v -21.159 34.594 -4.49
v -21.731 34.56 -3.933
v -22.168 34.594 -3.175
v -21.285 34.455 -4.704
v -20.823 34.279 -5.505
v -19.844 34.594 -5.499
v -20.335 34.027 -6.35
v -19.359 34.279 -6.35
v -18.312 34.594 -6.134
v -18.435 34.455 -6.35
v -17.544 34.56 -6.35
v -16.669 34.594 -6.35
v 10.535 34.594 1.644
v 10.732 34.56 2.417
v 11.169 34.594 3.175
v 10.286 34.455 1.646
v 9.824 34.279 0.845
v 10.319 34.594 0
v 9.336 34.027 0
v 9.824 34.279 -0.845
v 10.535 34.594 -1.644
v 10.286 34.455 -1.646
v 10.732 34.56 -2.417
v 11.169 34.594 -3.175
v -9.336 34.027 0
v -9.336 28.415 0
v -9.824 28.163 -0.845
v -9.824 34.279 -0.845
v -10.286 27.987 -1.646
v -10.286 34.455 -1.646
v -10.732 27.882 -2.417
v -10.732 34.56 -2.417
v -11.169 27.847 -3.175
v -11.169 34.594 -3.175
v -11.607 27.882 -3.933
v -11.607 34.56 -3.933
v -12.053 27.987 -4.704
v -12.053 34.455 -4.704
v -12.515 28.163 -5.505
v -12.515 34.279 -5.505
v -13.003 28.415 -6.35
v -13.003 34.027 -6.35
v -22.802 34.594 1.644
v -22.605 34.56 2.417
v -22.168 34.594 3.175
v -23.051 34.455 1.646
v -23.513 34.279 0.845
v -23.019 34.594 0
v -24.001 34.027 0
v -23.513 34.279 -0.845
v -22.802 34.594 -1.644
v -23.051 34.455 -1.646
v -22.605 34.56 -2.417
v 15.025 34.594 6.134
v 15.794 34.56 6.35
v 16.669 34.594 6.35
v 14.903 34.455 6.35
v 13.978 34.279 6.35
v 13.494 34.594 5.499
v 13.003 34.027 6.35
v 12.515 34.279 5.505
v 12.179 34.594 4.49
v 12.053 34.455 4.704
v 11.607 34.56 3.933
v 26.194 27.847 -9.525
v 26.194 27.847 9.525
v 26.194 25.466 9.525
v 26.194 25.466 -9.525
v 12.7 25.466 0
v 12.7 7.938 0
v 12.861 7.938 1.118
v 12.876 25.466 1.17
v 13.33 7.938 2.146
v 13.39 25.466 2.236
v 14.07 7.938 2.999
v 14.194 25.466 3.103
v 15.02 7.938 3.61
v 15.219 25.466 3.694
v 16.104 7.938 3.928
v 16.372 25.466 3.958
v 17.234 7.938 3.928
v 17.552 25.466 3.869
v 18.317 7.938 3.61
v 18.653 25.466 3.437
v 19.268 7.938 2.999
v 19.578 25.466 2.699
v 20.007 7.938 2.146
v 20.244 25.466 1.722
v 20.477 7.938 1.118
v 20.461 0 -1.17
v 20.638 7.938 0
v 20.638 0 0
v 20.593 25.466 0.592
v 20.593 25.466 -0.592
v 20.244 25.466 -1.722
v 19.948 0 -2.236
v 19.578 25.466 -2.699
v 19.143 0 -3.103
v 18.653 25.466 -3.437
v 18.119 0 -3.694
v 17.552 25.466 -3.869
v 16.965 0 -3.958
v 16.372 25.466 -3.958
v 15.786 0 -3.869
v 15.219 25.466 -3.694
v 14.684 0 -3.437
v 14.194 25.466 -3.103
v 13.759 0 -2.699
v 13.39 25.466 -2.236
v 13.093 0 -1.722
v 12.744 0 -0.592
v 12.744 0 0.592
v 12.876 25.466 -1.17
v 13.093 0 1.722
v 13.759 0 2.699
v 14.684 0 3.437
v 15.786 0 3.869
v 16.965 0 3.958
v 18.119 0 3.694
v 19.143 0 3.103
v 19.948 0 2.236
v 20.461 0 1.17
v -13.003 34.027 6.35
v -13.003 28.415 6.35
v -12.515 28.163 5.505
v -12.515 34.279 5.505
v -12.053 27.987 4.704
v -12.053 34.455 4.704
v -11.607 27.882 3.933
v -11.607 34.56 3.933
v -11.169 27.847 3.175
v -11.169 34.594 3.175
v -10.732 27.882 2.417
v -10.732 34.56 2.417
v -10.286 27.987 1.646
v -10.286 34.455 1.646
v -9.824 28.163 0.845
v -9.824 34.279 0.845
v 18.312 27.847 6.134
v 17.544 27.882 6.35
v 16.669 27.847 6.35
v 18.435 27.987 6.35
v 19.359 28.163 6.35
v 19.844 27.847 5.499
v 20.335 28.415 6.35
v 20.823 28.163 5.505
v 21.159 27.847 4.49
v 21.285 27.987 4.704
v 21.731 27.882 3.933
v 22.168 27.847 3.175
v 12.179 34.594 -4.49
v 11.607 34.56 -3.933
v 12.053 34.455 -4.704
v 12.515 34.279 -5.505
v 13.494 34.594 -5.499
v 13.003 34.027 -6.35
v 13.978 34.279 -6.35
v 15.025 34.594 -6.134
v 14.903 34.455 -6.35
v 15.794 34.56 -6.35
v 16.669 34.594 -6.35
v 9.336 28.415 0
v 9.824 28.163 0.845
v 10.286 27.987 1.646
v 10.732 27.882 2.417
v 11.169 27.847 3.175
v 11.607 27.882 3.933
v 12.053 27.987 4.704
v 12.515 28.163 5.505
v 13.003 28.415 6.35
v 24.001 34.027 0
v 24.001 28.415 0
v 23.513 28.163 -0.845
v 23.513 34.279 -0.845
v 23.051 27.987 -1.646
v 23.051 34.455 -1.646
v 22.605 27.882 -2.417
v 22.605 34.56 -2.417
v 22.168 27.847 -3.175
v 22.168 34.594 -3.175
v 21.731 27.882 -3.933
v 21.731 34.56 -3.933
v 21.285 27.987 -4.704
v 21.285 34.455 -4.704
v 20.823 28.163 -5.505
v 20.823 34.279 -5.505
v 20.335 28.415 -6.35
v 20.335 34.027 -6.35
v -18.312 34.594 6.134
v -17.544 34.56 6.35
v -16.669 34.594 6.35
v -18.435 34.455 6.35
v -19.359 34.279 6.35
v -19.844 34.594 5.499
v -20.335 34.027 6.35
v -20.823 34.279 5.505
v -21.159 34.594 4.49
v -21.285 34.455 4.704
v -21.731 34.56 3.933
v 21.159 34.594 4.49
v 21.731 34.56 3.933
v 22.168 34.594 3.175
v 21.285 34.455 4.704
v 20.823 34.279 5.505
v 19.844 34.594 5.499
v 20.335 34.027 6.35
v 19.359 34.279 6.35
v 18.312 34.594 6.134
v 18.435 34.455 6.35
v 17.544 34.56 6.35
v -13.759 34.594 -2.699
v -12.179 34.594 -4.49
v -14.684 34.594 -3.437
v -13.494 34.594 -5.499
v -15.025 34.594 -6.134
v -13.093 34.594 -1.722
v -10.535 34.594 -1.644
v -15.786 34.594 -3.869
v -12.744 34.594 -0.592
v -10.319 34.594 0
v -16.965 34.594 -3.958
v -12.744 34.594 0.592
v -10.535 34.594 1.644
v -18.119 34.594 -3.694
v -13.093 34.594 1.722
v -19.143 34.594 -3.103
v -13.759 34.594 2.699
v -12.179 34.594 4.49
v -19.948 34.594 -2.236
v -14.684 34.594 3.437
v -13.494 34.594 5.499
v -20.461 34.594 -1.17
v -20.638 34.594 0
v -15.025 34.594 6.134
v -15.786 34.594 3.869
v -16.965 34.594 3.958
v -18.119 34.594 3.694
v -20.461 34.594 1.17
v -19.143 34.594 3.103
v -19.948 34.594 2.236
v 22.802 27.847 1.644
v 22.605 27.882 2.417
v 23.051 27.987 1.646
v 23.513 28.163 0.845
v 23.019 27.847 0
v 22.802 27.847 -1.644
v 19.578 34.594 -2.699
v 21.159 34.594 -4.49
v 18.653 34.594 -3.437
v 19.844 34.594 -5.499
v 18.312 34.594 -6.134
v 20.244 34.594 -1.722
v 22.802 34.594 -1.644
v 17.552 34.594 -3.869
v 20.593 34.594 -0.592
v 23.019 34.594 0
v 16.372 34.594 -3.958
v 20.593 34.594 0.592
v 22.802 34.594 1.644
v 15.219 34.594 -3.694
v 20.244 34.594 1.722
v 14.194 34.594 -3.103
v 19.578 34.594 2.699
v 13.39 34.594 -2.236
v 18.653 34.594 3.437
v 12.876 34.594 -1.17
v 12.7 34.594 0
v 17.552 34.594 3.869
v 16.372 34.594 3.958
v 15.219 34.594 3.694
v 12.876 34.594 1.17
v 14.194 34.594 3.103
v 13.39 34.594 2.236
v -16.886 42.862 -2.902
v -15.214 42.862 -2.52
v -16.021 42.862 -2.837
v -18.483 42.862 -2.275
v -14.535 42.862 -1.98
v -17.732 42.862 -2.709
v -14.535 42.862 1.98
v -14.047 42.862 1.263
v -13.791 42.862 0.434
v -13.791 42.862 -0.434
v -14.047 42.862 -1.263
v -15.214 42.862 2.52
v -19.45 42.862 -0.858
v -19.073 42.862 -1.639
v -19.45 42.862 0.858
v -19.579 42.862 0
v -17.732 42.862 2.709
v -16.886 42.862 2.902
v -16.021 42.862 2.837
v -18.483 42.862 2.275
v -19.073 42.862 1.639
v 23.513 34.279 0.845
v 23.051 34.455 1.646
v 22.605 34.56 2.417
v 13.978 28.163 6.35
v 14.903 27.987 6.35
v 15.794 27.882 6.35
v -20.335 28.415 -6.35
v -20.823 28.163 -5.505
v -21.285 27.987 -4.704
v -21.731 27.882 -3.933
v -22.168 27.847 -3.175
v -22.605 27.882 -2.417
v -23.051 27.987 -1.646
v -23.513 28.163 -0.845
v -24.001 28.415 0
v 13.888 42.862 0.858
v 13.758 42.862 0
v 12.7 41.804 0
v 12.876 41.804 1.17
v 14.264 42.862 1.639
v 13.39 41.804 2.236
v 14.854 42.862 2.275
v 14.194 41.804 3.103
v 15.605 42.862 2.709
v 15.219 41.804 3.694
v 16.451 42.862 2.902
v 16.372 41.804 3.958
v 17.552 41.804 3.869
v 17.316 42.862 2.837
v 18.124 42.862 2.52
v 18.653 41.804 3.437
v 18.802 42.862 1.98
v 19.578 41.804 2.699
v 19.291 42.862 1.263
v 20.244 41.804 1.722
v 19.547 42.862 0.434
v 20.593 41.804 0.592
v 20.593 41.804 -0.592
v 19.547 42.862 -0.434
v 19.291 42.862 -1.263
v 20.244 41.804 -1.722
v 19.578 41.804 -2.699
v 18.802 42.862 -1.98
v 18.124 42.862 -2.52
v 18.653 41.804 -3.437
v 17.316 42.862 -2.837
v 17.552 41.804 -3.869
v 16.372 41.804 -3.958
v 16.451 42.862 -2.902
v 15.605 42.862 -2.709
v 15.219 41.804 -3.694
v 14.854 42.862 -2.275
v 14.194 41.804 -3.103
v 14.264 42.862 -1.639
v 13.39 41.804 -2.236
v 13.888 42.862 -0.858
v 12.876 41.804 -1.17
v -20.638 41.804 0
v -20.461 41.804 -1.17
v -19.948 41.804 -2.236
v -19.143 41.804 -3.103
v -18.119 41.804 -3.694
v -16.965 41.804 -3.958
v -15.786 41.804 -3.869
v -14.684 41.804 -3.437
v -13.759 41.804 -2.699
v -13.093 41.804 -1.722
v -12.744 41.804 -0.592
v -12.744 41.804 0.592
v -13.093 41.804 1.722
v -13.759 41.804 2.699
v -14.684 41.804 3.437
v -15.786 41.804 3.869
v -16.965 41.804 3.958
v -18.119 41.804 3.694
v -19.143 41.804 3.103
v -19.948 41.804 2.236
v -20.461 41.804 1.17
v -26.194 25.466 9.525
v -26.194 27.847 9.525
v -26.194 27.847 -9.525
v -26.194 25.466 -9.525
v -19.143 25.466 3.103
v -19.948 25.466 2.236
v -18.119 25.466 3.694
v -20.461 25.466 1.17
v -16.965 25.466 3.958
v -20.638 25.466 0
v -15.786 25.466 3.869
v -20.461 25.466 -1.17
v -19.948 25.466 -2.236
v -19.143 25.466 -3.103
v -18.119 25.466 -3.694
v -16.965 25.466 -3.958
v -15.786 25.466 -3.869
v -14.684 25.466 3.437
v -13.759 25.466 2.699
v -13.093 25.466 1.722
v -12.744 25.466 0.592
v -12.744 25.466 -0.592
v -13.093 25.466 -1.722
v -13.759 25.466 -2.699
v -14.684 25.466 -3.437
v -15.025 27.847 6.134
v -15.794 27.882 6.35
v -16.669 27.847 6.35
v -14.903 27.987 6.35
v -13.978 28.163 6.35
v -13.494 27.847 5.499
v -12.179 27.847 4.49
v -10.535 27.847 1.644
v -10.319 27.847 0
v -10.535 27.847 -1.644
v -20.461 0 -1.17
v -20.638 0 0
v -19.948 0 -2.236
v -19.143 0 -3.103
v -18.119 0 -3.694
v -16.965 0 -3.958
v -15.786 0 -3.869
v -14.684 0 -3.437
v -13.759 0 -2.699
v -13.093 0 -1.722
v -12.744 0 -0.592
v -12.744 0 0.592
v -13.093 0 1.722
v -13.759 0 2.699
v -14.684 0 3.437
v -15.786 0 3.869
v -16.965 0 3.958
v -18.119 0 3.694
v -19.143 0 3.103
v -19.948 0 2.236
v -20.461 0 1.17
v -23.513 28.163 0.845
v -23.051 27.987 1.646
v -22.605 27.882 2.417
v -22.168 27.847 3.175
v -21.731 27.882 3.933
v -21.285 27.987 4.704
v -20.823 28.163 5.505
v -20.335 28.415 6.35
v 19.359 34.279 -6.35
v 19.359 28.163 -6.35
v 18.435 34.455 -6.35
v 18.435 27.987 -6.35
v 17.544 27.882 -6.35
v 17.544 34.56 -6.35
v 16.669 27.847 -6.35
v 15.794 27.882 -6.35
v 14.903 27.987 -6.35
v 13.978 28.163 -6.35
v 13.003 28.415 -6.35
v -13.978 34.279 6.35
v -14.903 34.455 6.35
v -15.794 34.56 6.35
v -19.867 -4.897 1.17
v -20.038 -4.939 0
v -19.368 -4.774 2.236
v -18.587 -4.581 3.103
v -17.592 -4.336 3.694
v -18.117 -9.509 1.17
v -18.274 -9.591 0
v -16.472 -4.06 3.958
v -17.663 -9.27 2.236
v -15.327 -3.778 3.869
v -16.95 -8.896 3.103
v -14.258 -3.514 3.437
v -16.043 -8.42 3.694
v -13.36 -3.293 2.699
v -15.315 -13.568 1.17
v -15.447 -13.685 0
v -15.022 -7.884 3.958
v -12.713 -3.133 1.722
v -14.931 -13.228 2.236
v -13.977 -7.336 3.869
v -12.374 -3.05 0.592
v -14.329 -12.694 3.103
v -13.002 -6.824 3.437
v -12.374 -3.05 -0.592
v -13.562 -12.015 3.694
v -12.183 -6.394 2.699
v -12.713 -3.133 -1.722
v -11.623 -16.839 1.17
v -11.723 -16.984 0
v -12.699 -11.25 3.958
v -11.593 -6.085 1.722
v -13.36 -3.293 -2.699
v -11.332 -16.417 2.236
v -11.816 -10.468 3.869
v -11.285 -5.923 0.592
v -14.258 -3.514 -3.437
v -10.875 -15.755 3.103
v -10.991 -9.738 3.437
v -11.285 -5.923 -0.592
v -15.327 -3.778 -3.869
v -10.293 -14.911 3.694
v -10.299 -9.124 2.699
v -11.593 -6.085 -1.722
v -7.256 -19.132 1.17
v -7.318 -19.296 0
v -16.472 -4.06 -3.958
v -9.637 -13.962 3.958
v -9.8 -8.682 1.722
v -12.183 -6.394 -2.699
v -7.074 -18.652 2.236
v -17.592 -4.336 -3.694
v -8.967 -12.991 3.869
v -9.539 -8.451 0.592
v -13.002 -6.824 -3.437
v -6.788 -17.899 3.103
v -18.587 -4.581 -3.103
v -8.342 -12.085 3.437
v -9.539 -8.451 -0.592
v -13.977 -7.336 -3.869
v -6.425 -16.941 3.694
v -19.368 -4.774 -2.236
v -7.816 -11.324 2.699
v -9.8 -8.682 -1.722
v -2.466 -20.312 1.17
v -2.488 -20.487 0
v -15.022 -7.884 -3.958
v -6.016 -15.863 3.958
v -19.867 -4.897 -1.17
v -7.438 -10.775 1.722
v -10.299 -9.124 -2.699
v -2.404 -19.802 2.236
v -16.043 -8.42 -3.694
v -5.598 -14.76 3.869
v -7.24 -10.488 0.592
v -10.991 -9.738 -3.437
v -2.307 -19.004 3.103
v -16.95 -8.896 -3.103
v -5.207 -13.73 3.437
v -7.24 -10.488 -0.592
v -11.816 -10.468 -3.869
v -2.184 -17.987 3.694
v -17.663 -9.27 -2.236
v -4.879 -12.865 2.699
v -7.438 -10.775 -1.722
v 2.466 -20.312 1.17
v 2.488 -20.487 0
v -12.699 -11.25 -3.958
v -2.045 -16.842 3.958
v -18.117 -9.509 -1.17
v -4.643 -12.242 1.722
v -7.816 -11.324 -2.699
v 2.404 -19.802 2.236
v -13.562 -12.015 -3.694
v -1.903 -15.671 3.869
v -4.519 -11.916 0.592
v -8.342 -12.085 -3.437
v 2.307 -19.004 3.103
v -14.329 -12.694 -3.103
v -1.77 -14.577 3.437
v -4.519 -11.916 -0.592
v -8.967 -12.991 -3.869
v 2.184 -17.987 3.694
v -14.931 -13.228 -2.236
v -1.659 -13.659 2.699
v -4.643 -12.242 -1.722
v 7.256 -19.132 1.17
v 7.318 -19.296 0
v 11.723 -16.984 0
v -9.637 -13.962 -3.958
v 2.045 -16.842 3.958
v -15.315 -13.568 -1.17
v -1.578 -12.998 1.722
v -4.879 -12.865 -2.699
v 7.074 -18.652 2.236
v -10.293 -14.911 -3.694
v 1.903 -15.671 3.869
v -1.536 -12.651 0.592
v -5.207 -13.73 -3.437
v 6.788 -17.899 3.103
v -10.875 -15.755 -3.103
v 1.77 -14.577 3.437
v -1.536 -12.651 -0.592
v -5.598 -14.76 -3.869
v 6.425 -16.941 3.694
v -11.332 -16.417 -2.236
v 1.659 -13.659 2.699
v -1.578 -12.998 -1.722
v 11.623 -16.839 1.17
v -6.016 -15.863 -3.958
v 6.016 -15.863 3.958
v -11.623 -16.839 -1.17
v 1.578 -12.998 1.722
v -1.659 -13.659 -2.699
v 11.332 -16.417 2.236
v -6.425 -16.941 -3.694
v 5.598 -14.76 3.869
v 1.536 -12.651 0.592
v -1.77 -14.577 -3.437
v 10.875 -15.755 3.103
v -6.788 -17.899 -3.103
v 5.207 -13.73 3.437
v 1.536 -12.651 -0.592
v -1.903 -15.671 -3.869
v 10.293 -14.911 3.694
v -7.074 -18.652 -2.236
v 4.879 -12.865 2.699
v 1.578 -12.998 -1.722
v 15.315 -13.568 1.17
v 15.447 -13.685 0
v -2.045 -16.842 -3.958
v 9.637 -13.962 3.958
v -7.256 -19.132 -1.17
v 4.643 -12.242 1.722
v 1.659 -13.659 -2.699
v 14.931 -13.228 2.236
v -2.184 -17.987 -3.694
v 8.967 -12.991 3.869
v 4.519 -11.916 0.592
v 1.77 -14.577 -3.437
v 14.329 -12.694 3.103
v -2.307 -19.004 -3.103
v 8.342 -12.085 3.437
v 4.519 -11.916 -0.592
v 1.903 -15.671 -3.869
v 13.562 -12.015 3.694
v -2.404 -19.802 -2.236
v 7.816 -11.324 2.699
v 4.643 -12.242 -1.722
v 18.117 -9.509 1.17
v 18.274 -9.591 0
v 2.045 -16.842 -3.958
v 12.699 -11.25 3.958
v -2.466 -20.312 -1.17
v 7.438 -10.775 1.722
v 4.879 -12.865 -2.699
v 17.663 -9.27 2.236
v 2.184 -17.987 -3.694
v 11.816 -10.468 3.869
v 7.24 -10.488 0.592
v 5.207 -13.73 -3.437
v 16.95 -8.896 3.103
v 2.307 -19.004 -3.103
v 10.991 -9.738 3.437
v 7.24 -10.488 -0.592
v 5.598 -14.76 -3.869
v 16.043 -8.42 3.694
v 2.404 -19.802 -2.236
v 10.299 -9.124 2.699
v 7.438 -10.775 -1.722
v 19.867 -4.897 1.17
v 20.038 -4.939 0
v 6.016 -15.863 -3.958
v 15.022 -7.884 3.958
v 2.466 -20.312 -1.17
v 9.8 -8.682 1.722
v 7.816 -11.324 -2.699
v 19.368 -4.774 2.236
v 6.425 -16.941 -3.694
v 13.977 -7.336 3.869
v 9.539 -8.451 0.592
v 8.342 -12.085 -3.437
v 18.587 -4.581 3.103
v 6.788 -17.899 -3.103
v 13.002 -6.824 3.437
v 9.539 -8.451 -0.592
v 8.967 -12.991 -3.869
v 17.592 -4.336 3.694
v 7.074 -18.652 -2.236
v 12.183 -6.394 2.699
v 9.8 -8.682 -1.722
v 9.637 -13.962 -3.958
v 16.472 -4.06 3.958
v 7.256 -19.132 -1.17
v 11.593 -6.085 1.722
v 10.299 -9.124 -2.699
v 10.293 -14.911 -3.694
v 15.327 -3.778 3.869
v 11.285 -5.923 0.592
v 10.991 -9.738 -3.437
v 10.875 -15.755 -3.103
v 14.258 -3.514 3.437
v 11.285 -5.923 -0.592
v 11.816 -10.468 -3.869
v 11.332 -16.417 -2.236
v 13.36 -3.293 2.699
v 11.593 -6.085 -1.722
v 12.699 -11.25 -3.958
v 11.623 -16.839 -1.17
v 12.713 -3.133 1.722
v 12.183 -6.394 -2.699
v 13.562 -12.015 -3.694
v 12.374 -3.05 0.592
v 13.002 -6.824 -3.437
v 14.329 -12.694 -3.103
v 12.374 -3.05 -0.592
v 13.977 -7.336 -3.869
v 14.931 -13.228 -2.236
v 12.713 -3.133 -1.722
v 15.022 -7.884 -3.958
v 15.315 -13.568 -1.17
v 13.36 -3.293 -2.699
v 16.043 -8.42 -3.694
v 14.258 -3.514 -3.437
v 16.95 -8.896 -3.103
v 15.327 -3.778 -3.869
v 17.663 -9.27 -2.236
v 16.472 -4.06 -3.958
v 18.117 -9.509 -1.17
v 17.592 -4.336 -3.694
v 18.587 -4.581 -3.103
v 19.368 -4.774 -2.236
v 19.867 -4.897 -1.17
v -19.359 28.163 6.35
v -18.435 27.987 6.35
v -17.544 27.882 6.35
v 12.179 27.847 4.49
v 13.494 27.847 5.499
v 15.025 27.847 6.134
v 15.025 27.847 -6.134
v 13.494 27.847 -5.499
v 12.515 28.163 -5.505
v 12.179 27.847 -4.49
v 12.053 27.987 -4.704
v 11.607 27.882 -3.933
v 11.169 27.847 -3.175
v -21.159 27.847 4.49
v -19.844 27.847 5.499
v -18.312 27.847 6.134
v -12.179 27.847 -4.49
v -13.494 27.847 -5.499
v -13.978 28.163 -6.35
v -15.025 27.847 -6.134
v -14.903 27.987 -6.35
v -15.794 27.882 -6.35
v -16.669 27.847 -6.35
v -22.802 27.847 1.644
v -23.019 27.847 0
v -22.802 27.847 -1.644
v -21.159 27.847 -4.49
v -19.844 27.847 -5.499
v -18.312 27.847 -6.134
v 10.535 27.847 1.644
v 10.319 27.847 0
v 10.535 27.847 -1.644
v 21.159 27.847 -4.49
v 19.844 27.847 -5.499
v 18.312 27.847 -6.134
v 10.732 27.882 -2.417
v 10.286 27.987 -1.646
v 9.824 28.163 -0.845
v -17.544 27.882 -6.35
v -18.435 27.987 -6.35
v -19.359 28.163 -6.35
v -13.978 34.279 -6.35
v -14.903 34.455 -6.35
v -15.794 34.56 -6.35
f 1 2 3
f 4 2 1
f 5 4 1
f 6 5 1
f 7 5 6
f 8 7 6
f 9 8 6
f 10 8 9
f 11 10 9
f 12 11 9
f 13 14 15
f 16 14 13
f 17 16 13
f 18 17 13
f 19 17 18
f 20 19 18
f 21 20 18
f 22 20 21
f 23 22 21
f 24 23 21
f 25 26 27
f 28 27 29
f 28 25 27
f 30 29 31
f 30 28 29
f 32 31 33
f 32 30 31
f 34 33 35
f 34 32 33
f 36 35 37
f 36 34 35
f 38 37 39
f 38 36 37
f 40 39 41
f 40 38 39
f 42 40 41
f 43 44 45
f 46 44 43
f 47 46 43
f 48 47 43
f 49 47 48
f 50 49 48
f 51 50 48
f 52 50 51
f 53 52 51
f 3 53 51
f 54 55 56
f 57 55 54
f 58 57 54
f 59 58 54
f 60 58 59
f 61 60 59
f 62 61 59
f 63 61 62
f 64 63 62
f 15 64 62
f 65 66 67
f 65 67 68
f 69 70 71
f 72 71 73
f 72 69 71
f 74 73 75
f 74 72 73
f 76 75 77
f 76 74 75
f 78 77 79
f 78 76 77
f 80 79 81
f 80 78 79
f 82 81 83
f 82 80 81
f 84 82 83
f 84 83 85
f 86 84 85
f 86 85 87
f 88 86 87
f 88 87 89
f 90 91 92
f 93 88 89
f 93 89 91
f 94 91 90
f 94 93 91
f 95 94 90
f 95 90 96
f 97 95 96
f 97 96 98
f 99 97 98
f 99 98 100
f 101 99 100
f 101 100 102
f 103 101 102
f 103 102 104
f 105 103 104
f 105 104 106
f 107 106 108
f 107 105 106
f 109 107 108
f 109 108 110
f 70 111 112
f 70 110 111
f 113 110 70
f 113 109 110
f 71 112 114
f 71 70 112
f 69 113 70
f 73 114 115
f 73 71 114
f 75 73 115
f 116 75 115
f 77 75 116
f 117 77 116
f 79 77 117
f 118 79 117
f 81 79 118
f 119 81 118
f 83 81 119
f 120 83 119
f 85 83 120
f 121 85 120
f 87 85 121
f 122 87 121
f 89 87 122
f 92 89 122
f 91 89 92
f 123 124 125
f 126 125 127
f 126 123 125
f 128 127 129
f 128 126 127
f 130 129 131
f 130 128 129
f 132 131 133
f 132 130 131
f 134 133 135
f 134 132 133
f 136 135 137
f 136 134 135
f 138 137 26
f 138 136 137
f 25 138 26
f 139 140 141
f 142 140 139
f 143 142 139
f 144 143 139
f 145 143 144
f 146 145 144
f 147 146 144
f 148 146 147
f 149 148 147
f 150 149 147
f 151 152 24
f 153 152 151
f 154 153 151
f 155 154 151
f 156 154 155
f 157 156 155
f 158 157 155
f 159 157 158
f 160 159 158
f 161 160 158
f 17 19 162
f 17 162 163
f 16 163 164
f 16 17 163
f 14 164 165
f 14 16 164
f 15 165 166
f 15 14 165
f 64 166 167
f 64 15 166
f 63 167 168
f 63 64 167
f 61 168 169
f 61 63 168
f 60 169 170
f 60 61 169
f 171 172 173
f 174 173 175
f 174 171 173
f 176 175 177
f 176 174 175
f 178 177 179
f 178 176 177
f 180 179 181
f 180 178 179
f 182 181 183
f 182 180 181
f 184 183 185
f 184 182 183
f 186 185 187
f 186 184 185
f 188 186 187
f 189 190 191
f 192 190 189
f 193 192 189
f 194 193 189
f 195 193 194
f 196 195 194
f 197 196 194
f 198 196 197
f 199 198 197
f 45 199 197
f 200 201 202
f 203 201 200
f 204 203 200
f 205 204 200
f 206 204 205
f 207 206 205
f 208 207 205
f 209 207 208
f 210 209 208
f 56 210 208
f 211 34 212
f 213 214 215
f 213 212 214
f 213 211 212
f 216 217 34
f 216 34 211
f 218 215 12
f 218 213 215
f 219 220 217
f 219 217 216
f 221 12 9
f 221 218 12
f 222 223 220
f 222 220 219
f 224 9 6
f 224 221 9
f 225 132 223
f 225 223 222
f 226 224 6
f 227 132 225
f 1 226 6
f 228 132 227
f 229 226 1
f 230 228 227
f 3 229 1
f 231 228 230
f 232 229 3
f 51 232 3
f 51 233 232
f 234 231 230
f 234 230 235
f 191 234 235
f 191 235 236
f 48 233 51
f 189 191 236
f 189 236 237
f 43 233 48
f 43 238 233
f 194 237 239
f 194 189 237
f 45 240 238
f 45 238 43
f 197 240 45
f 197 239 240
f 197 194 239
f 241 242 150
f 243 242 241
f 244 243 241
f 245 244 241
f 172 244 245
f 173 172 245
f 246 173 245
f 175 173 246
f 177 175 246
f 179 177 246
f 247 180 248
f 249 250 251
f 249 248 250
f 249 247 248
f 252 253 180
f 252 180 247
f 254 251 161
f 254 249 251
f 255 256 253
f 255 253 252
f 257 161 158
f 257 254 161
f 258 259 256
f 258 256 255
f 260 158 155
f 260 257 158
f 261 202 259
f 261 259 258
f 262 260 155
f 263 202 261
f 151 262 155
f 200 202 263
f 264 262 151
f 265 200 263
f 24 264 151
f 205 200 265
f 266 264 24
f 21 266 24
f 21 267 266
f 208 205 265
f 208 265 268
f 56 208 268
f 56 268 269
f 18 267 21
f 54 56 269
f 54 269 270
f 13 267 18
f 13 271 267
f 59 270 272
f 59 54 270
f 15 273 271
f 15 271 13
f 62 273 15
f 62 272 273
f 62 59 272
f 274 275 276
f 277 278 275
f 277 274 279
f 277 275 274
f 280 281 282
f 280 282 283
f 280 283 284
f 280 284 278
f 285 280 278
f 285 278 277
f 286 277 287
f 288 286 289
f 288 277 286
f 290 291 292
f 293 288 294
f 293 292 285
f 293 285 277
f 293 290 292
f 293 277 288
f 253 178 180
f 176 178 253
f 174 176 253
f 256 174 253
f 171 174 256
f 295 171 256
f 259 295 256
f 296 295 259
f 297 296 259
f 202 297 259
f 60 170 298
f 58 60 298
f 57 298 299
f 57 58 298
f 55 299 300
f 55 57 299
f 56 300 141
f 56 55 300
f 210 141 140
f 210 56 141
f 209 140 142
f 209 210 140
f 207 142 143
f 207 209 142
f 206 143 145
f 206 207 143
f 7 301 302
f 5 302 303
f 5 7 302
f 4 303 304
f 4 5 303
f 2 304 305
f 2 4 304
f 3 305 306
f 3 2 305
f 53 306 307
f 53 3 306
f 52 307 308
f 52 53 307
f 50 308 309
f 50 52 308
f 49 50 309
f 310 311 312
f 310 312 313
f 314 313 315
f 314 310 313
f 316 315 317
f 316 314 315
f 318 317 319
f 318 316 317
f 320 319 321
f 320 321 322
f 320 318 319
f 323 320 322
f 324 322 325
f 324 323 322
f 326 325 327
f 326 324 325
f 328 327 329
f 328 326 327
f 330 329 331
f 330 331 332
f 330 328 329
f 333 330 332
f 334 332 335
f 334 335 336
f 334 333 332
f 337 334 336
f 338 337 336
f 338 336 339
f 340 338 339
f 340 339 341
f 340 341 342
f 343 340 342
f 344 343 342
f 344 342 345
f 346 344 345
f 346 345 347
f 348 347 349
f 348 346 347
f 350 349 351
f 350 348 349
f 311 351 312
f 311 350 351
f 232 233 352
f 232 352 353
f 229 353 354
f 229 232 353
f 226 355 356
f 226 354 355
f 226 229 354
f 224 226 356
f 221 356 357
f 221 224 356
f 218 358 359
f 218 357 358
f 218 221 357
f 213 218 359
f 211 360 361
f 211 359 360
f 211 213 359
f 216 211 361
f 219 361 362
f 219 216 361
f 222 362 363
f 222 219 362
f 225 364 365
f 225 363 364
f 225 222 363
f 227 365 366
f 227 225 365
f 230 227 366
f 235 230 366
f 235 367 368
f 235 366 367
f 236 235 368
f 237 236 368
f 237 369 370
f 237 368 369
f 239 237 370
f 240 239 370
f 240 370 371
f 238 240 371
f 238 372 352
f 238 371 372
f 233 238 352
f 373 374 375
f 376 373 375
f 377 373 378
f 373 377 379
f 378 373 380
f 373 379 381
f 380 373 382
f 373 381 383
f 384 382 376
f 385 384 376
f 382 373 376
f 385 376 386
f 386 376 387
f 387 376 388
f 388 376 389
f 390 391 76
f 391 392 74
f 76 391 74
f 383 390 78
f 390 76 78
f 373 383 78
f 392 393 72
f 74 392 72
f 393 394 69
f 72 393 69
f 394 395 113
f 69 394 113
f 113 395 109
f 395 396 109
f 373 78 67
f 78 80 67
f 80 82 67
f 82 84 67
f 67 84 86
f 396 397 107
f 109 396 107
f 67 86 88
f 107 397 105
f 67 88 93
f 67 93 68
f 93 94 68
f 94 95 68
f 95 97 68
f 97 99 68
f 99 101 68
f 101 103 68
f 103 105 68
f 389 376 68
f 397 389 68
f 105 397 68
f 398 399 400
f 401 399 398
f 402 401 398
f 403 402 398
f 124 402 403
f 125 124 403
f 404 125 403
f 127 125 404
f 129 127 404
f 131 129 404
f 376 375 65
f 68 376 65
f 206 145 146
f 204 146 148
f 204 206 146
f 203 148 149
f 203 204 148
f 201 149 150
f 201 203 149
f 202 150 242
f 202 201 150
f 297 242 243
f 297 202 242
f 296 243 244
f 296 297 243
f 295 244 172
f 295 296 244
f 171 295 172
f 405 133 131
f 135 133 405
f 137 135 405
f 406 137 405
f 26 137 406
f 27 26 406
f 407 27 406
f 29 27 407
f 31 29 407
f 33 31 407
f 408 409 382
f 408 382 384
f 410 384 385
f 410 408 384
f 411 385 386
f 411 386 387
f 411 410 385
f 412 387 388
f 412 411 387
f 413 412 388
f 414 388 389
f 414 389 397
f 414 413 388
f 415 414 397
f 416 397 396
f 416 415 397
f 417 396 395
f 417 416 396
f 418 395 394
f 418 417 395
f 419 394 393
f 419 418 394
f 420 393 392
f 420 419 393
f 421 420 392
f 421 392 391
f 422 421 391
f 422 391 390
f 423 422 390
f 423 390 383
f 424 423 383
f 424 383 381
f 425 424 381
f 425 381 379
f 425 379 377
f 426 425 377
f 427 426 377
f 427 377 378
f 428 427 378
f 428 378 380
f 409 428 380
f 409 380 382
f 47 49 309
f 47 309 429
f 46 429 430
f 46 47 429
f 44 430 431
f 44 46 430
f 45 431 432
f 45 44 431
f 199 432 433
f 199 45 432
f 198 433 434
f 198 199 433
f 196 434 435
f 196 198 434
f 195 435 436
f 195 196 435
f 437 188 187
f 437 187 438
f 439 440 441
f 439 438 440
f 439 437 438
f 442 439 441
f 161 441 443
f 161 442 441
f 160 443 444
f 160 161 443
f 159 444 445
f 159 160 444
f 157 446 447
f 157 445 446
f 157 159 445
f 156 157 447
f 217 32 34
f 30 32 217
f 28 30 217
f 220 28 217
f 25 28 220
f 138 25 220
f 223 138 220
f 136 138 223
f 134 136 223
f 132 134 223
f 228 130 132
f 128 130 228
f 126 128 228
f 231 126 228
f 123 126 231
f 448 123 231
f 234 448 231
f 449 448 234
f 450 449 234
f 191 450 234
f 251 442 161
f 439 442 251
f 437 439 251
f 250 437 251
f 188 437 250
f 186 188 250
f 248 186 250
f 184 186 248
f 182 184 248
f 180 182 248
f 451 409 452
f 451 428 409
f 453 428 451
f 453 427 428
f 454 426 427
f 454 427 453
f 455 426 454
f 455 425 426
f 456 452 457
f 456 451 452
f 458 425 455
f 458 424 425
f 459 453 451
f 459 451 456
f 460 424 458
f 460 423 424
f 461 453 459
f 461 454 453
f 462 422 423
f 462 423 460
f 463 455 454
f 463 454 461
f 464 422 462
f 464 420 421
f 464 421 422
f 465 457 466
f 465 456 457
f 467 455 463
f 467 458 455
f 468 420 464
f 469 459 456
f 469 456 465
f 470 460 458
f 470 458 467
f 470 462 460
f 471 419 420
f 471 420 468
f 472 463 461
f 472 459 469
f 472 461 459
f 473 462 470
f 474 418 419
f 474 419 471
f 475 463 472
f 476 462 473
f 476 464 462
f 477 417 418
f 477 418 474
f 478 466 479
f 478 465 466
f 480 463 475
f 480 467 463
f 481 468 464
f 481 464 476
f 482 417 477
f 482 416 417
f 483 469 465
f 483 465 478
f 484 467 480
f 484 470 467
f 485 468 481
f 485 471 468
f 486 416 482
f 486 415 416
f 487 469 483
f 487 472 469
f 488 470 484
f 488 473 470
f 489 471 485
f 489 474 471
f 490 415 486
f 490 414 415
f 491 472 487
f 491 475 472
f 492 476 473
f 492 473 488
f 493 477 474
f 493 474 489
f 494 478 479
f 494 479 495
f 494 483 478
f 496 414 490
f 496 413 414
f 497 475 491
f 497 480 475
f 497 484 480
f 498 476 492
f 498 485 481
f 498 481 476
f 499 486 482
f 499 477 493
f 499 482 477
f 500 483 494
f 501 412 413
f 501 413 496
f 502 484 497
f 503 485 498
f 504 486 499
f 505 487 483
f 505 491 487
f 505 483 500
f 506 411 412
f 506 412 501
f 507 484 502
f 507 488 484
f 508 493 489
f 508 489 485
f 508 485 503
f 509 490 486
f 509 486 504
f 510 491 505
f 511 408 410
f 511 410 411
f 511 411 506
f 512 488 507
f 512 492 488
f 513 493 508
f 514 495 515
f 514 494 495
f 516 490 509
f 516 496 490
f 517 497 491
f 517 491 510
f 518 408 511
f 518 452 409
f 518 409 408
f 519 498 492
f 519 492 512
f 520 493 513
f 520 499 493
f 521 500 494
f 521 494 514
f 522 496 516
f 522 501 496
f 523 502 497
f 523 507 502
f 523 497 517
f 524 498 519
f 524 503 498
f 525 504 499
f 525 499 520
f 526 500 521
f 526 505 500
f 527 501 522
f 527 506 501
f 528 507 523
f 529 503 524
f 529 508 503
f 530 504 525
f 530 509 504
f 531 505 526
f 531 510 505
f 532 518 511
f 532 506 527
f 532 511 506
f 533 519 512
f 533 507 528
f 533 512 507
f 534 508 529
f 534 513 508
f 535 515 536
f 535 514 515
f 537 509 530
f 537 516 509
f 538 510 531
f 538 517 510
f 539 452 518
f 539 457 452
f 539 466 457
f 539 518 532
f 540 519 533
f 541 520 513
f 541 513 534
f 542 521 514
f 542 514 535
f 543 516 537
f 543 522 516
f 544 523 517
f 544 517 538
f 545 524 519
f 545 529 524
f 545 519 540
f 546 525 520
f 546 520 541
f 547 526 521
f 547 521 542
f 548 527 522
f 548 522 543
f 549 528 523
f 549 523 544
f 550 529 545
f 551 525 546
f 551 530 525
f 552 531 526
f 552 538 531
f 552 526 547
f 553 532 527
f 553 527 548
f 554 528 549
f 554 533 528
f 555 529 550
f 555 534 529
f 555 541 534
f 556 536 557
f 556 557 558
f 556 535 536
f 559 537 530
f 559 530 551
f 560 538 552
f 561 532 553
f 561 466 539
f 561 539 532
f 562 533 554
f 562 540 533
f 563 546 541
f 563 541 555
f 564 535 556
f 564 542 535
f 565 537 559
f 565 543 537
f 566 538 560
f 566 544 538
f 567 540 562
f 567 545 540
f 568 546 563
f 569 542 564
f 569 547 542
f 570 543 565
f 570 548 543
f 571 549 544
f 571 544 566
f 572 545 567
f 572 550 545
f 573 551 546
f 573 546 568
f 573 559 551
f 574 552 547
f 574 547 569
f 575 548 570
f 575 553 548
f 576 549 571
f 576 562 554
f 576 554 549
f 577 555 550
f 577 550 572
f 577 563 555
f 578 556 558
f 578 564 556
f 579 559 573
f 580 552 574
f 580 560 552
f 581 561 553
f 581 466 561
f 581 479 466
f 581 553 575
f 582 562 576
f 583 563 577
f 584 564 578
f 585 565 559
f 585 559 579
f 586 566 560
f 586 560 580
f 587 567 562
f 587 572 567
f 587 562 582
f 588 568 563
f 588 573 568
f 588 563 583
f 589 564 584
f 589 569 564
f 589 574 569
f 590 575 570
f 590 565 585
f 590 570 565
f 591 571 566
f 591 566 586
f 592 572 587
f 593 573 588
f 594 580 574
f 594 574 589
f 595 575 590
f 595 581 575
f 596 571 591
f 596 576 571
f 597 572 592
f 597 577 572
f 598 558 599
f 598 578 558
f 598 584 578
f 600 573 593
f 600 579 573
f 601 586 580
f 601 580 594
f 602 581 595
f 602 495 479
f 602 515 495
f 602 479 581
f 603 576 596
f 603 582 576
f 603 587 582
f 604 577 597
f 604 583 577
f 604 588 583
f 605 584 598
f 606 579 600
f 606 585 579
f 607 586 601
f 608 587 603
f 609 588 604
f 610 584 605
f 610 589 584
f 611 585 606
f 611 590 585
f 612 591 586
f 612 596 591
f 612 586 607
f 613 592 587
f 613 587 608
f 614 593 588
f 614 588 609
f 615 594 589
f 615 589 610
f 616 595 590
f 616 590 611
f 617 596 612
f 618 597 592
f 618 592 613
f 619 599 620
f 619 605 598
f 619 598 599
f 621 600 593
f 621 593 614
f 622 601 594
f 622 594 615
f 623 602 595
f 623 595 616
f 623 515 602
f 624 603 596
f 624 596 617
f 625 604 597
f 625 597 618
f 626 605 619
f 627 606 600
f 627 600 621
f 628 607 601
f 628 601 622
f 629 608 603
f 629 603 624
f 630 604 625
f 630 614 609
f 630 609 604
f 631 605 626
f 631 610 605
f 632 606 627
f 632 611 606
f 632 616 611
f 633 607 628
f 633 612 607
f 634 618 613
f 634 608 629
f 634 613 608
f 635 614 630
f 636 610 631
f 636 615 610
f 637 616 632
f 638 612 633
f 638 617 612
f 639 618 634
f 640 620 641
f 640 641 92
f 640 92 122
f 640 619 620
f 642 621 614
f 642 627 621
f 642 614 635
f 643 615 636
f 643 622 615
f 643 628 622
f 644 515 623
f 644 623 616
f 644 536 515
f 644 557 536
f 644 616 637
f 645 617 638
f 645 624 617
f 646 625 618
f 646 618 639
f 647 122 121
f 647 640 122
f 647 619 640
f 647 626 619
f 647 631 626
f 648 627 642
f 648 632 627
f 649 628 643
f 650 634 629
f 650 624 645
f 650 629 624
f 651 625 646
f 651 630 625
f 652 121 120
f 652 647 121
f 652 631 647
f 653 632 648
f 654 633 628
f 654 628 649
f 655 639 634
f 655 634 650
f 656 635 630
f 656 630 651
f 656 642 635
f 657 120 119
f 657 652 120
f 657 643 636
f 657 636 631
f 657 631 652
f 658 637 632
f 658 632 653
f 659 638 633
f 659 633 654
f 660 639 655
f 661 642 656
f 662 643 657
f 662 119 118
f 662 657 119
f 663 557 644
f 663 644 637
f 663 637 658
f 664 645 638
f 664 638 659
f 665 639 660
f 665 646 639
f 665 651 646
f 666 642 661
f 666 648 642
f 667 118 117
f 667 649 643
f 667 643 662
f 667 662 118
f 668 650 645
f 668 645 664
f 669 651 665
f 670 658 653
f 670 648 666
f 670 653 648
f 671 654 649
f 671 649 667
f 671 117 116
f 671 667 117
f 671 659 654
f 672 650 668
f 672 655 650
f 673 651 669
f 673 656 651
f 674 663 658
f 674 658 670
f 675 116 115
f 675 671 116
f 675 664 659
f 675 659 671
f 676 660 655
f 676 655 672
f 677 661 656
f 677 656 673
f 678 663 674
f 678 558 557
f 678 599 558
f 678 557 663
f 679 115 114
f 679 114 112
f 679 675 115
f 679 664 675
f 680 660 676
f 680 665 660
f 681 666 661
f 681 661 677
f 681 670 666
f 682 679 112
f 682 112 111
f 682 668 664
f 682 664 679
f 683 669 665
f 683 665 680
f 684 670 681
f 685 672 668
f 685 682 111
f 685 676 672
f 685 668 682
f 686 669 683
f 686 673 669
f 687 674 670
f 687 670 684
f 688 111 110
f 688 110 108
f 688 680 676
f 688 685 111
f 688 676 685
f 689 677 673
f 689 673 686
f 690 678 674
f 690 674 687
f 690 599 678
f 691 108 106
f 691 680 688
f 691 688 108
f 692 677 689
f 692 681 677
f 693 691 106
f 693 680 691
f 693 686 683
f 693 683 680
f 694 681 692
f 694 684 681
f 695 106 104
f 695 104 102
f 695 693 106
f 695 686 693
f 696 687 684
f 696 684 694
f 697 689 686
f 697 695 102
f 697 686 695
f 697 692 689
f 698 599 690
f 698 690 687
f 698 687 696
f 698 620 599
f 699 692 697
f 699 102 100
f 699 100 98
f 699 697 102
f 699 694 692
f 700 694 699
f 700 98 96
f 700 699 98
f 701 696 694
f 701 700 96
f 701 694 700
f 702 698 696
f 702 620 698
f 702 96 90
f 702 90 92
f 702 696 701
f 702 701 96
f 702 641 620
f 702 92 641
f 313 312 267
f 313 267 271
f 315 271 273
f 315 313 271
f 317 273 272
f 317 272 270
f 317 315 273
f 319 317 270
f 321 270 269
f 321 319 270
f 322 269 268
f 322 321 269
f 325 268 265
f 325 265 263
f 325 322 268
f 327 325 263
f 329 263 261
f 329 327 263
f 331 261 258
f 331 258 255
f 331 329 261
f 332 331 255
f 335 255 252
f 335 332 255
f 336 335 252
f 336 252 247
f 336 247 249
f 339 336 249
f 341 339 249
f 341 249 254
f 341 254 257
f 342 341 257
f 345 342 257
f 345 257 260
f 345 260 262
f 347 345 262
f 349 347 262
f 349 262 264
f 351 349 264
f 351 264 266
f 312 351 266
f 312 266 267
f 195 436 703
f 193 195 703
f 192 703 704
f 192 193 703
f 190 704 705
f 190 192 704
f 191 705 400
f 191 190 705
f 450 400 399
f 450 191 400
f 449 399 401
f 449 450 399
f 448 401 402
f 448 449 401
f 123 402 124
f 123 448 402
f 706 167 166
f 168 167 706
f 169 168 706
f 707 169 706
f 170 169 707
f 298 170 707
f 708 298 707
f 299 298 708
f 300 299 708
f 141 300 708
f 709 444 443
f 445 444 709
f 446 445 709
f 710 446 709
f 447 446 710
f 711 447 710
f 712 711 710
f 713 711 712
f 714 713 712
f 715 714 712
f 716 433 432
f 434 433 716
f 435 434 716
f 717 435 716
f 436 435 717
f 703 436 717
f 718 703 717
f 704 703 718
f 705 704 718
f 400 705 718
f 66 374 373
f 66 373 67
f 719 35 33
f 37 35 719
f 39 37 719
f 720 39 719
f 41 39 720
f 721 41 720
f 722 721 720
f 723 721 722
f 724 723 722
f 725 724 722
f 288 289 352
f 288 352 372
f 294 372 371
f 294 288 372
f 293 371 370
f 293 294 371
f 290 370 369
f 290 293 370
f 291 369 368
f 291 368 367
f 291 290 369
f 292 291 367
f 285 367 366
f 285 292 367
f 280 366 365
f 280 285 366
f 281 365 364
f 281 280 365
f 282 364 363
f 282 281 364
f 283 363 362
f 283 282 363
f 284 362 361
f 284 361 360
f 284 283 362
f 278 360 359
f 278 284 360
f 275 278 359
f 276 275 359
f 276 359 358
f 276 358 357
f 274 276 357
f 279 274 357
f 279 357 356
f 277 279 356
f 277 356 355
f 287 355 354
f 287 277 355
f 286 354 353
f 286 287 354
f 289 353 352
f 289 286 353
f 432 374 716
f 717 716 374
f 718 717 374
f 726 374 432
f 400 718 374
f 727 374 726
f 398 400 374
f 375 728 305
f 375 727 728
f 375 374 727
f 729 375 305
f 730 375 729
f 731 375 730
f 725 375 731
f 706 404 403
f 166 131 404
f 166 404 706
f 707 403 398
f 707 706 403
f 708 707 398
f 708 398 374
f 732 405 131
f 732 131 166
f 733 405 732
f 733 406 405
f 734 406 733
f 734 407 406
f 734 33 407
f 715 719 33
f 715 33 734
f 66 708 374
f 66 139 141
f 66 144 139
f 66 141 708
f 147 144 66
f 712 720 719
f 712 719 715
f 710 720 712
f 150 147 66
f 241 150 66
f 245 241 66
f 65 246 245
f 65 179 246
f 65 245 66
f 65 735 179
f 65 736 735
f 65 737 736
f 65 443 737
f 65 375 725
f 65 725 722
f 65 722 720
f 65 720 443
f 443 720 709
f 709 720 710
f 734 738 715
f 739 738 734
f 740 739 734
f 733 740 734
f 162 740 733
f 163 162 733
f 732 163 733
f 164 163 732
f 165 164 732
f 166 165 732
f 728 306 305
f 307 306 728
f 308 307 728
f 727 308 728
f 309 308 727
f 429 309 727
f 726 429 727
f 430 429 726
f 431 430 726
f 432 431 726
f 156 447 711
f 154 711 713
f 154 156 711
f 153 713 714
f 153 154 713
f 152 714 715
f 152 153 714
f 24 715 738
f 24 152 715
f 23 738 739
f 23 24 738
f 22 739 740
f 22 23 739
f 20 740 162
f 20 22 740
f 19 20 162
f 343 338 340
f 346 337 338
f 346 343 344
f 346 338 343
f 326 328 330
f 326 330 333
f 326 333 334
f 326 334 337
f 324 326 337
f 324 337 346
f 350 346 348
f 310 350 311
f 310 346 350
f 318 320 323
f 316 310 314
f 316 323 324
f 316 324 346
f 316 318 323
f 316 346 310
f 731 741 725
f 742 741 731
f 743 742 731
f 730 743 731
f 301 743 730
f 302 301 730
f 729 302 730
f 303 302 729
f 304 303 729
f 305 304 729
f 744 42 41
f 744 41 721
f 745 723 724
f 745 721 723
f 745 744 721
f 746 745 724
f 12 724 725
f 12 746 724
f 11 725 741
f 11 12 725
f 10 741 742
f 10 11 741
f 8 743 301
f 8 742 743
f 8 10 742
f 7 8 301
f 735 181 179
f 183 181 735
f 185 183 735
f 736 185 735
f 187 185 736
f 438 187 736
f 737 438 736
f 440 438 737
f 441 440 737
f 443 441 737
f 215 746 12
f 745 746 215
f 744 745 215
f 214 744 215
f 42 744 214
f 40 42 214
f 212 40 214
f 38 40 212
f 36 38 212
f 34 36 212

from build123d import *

# Parameters (mm, degrees)
SKETCH2_R           = 3.96875
BOSS_EXTRUDE1_DEPTH = 34.925
CHAMFER2_SIZE       = 1.058333333
SKETCH7_R           = 3.96875
SKETCH9_R           = 3.96875
BOSS_EXTRUDE2_DEPTH = 3.3734375
SKETCH10_OUTSIDE_W  = 257.161
SKETCH10_OUTSIDE_H  = 225.222
SKETCH10_OUTSIDE_R  = 6.35
CUT_EXTRUDE1_DEPTH  = 56.231770933
CUT_EXTRUDE1_TAPER  = 60
SKETCH11_OUTSIDE_W  = 117.847
SKETCH11_OUTSIDE_H  = 85.908
SKETCH11_OUTSIDE_R  = 6.35
CUT_EXTRUDE2_DEPTH  = 16.015104167
CUT_EXTRUDE2_TAPER  = 60
SKETCH12_W          = 52.3875
SKETCH12_H          = 19.05
BOSS_EXTRUDE3_DEPTH = 2.38125


with BuildPart() as part:
    # Sketch2 → Boss-Extrude1 (new body)
    with BuildSketch(Plane(origin=(0, 42.8625, 0), x_dir=(-1, 0, 0), z_dir=(0, 1, 0))):
        with Locations((16.66875, 0)):
            Circle(SKETCH2_R)
    extrude(amount=-BOSS_EXTRUDE1_DEPTH)

    # Chamfer2
    chamfer2_edges = [part.edges().sort_by_distance(p)[0] for p in [
        (-12.7, 42.8625, 0),
    ]]
    chamfer(chamfer2_edges, length=CHAMFER2_SIZE)


with BuildPart() as body_2:
    # Sweep1: sweep along a path in Sketch8
    with BuildLine(Plane.XY) as sweep1_path:
        Line((-16.66875, 7.9375), (-16.66875, 0))
        ThreePointArc((-16.66875, 0), (0, -16.66875), (16.66875, 0))
        Line((16.66875, 0), (16.66875, 7.9375))
    # Sketch7 → Sweep1 (sweep)
    with BuildSketch(Plane(origin=(0, 7.9375, 0), x_dir=(-1, 0, 0), z_dir=(0, 1, 0))):
        with Locations((16.66875, 0)):
            Circle(SKETCH7_R)
    sweep(path=sweep1_path.line)


with BuildPart() as body_3:
    # Body-Move/Copy1: copy of part
    add(part.part.moved(Location((33.3375, 0, 0))))


with BuildPart() as part_1:
    add(part.part)

    # Combine1: union body 2, body 3
    add(body_2.part)
    add(body_3.part)



with BuildPart() as body_2_2:
    # Sketch9 → Boss-Extrude2 (new body, symmetric)
    with BuildSketch(Plane(origin=(0, 31.220833333, 0), x_dir=(-1, 0, 0), z_dir=(0, 1, 0))):
        Polygon((-20.334924209, 6.35), (-24.001098419, 0), (-20.334924209, -6.35), (-13.002575791, -6.35), (-9.336401581, 0), (-13.002575791, 6.35), align=None)
        with Locations((-16.66875, 0)):
            Circle(SKETCH9_R, mode=Mode.SUBTRACT)
    extrude(amount=BOSS_EXTRUDE2_DEPTH, both=True)

    # Sketch10 outside → Cut-Extrude1 (cut, through all)
    with BuildSketch(Plane(origin=(0, 34.594270833, 0), x_dir=(1, 0, 0), z_dir=(0, 1, 0))):
        with Locations((1.6815, 0)):
            Rectangle(SKETCH10_OUTSIDE_W, SKETCH10_OUTSIDE_H)
        with Locations((16.66875, 0)):
            Circle(SKETCH10_OUTSIDE_R, mode=Mode.SUBTRACT)
    extrude(amount=-CUT_EXTRUDE1_DEPTH, taper=CUT_EXTRUDE1_TAPER, mode=Mode.SUBTRACT)

    # Sketch11 outside → Cut-Extrude2 (cut, through all)
    with BuildSketch(Plane.XZ.offset(-27.847395833)):
        with Locations((1.6815, 0)):
            Rectangle(SKETCH11_OUTSIDE_W, SKETCH11_OUTSIDE_H)
        with Locations((16.66875, 0)):
            Circle(SKETCH11_OUTSIDE_R, mode=Mode.SUBTRACT)
    extrude(amount=-CUT_EXTRUDE2_DEPTH, taper=CUT_EXTRUDE2_TAPER, mode=Mode.SUBTRACT)


with BuildPart() as body_3_2:
    # Body-Move/Copy2: copy of body 2 2
    add(body_2_2.part.moved(Location((-33.3375, 0, 0))))


with BuildPart() as part_2:
    add(part_1.part)

    add(body_2_2.part)  # Boss-Extrude3 merges body 2 2

    add(body_3_2.part)  # Boss-Extrude3 merges body 3 2
    # Sketch12 → Boss-Extrude3 (add)
    with BuildSketch(Plane(origin=(0, 27.847395833, 0), x_dir=(1, 0, 0), z_dir=(0, 1, 0))):
        Rectangle(SKETCH12_W, SKETCH12_H)
    extrude(amount=-BOSS_EXTRUDE3_DEPTH)


solid = part_2.part
